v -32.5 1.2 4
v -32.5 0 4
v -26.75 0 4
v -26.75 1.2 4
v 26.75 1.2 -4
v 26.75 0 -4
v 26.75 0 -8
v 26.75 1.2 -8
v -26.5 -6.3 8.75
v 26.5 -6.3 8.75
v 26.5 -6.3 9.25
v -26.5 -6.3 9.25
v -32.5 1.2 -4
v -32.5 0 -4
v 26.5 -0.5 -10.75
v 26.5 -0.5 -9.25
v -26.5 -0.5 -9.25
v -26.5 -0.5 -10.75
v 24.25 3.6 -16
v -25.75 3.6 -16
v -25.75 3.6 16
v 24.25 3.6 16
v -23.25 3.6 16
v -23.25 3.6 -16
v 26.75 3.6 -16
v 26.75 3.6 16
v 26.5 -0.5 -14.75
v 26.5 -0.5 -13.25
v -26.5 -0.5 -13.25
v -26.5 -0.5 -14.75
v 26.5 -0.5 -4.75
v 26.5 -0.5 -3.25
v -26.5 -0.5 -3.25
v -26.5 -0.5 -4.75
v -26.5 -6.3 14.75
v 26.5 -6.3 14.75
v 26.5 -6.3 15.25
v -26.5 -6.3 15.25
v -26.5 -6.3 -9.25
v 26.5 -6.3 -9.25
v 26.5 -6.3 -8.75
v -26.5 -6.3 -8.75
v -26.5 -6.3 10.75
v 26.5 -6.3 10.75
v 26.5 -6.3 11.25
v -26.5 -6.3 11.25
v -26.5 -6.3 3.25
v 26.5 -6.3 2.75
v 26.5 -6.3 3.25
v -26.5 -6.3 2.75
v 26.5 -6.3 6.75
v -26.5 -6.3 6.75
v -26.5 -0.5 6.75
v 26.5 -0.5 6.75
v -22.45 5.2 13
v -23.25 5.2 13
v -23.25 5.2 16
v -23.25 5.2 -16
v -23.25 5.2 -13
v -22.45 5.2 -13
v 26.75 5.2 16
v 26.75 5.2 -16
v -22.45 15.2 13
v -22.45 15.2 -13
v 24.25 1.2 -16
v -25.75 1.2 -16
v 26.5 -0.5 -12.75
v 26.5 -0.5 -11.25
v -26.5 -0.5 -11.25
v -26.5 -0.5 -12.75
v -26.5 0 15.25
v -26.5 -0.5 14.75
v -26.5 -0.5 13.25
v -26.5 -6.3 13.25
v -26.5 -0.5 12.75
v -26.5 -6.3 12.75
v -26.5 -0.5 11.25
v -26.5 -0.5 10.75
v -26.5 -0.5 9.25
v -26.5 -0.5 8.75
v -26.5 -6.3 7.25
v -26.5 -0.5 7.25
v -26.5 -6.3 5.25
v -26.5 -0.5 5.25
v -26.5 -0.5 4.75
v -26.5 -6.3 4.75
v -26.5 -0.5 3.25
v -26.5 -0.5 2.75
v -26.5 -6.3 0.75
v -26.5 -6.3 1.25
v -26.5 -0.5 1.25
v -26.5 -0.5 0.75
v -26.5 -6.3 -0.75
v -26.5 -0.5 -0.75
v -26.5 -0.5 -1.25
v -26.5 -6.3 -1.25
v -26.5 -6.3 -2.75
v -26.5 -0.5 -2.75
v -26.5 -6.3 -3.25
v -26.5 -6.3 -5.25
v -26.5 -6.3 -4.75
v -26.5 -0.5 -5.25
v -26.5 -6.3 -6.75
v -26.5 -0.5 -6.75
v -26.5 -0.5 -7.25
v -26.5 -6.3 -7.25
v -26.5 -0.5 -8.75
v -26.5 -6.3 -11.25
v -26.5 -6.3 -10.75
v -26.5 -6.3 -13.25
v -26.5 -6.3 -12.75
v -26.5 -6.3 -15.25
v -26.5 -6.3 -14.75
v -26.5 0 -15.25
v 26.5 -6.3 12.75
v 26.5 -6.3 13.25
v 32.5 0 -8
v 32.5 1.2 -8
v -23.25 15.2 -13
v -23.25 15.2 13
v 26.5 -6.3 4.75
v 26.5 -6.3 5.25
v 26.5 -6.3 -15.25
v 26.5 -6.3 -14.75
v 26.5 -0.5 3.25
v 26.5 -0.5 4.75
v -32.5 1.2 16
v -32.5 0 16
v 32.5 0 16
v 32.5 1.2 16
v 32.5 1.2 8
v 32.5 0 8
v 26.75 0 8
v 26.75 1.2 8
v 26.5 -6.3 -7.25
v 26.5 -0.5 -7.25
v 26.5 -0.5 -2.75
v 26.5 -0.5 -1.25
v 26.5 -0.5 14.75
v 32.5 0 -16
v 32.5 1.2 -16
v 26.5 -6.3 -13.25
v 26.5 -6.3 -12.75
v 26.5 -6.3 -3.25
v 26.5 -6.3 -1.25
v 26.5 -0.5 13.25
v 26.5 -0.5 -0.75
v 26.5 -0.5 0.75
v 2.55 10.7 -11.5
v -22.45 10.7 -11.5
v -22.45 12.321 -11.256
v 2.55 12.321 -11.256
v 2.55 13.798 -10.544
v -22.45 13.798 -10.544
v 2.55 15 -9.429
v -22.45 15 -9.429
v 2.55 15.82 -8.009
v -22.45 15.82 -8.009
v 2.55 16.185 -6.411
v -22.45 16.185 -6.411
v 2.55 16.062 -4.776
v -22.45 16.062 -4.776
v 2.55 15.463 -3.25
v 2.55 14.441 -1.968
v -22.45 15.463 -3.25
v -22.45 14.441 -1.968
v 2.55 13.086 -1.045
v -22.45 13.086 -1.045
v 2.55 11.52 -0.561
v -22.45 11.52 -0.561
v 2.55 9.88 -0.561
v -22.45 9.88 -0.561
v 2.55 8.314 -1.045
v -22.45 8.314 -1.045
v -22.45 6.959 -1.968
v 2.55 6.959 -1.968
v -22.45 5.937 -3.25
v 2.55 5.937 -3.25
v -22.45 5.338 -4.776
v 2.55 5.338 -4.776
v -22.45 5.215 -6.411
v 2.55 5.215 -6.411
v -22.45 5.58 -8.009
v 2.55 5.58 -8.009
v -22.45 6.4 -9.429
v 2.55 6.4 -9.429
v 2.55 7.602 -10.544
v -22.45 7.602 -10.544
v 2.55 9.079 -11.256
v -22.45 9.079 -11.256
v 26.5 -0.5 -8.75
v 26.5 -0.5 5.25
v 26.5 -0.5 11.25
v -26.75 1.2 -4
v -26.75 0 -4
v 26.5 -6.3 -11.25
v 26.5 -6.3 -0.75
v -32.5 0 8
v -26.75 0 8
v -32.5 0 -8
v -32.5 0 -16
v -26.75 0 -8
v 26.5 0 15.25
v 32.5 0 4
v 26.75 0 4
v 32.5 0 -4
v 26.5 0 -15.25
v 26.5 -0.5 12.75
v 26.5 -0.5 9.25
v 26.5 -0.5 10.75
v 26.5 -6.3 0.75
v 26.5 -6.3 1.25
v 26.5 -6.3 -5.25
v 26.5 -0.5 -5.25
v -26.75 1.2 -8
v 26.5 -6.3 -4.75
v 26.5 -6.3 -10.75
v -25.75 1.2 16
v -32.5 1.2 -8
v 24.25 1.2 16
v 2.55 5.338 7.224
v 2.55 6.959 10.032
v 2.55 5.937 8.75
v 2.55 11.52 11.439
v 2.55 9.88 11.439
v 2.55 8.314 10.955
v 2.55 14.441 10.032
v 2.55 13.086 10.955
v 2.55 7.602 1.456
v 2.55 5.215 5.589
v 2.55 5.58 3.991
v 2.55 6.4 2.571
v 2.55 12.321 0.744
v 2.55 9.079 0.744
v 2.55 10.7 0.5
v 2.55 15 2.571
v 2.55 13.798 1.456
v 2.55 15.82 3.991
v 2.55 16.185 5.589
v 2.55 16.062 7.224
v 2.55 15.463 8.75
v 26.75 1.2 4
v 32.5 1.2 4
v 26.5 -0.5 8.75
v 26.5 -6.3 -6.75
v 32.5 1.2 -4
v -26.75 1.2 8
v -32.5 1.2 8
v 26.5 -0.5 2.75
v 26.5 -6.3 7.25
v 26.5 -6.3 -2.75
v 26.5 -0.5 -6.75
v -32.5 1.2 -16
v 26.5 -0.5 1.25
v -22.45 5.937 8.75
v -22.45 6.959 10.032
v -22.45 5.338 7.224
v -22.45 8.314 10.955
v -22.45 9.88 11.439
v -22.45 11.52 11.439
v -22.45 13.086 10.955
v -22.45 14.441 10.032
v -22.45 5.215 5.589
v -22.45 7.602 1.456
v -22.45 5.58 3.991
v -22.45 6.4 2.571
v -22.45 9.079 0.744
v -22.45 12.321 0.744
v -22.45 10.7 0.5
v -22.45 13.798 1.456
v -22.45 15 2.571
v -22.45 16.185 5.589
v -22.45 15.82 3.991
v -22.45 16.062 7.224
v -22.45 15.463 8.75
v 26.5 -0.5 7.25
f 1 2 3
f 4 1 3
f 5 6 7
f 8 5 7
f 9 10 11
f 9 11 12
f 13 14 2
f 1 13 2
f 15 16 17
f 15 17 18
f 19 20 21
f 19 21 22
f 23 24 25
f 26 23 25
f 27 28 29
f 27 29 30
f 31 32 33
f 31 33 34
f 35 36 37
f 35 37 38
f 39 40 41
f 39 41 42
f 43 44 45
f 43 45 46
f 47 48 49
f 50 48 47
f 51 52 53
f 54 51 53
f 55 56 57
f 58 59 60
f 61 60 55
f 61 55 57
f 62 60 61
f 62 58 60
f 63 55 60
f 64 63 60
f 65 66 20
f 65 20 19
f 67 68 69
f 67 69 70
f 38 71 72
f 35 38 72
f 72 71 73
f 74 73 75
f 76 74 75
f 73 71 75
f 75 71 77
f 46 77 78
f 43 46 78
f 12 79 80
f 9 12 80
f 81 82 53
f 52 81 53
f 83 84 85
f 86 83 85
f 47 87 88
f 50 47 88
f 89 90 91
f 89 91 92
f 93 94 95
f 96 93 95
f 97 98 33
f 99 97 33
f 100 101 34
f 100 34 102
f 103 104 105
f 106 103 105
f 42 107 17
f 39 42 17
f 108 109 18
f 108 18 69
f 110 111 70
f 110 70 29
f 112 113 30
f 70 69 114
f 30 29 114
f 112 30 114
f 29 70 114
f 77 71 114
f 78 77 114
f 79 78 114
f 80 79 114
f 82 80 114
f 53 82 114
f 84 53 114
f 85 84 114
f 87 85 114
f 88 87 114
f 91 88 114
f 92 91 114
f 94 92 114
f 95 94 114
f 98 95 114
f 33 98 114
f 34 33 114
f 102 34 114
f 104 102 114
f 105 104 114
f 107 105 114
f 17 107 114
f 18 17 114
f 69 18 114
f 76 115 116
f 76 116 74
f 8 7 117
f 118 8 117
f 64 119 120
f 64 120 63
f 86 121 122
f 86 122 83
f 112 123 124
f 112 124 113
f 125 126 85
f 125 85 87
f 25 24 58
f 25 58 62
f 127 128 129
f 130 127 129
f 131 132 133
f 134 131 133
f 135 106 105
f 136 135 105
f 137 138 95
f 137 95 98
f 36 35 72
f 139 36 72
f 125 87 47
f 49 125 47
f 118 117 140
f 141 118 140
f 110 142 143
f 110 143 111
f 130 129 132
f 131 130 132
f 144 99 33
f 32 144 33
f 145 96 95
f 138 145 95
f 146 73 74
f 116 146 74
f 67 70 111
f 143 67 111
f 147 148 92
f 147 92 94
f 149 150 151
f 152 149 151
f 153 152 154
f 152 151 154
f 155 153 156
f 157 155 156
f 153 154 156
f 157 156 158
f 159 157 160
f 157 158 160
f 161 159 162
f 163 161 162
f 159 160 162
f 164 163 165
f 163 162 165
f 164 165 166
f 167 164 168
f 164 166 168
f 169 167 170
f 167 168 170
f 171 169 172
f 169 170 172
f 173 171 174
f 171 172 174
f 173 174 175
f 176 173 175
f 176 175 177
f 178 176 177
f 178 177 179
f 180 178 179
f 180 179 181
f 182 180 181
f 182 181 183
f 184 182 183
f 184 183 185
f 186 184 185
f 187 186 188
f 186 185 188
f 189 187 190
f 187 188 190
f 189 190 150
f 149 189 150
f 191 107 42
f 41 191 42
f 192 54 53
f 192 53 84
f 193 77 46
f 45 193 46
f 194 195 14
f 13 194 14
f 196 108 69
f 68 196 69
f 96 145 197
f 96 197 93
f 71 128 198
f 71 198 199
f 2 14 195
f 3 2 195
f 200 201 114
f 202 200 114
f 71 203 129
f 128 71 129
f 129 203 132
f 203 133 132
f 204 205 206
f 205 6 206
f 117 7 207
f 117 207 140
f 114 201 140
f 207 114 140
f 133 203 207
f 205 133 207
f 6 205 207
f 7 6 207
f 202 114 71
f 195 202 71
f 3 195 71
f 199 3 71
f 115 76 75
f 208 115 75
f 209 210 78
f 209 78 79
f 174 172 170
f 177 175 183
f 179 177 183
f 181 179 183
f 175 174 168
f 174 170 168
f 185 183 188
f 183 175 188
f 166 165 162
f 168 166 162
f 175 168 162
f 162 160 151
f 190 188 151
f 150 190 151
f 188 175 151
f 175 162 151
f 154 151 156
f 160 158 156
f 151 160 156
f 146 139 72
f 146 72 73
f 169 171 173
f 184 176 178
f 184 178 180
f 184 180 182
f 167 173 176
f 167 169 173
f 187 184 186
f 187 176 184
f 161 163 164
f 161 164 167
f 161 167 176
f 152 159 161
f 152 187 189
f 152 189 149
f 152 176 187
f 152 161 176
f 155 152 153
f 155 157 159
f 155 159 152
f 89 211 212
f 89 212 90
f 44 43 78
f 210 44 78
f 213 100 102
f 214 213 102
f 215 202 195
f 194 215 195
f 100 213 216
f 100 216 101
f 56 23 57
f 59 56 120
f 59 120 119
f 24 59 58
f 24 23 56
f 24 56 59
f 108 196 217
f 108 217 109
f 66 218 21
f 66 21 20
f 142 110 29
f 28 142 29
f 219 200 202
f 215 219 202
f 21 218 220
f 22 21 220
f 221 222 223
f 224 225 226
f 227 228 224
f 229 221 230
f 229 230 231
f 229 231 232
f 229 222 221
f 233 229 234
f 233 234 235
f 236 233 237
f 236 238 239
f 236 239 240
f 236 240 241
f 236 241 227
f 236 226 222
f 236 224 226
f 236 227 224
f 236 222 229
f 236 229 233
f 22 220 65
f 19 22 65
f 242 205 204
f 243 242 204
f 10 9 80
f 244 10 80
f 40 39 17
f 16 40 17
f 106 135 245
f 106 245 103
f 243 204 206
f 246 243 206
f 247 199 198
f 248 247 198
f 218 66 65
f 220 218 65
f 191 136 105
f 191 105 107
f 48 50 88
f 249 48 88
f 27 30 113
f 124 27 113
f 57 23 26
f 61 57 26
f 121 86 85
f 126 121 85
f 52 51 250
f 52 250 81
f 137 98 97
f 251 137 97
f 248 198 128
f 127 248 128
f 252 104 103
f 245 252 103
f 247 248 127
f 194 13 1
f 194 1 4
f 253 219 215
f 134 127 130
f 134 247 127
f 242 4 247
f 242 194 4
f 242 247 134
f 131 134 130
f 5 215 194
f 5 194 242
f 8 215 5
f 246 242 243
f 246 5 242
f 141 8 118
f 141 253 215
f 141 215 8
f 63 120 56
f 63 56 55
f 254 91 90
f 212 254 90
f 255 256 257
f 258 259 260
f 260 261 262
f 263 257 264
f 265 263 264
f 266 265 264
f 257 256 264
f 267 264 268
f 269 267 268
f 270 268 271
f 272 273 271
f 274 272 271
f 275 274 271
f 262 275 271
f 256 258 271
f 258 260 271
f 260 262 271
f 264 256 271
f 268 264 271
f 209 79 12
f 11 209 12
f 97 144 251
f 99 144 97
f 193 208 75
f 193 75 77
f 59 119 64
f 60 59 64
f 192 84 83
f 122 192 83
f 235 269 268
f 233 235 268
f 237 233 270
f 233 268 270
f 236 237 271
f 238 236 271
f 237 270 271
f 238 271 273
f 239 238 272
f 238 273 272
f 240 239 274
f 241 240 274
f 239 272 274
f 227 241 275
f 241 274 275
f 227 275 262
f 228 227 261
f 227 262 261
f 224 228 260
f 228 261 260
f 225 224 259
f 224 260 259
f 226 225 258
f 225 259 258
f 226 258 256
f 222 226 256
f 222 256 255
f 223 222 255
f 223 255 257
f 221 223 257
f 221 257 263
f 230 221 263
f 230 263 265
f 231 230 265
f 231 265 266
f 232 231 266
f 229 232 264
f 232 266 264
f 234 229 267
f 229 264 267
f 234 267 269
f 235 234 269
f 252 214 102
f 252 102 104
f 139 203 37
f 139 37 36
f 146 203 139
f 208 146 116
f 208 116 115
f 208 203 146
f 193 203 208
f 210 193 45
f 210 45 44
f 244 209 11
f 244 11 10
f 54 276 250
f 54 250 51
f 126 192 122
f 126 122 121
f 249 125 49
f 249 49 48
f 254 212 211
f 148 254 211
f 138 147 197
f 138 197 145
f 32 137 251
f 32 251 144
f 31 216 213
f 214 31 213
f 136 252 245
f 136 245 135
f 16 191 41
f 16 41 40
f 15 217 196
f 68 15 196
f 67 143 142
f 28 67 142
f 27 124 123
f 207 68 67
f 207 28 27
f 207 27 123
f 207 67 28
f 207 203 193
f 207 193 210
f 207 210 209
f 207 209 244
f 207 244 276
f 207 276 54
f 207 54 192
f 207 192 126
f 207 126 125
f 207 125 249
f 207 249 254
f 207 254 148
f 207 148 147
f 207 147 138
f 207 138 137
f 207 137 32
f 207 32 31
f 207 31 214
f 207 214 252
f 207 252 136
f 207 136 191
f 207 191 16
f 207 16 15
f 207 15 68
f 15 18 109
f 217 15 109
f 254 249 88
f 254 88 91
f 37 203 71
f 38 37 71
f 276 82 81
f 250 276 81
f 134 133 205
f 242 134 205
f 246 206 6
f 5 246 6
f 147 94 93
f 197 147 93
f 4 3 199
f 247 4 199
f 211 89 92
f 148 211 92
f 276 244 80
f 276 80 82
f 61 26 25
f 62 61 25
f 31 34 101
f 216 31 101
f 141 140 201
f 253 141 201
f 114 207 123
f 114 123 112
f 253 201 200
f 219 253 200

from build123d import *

# Parameters (mm, degrees)
BOSS_EXTRUDE1_DEPTH   = 1.2
SKETCH2_W             = 50
SKETCH2_H             = 32
BOSS_EXTRUDE2_DEPTH   = 2.4
SKETCH3_W             = 50
SKETCH3_H             = 32
BOSS_EXTRUDE3_DEPTH   = 1.6
SKETCH4_W             = 0.8
SKETCH4_H             = 26
BOSS_EXTRUDE4_DEPTH   = 10
SKETCH5_R             = 5.5
BOSS_EXTRUDE6_DEPTH   = 25
BOSS_EXTRUDE6_2_DEPTH = 25
SKETCH6_W             = 53
SKETCH6_H             = 30.5
BOSS_EXTRUDE7_DEPTH   = 6.3
CUT_EXTRUDE7_DEPTH    = 60


with BuildPart() as part:
    # Sketch1 → Boss-Extrude1 (new body)
    with BuildSketch(Plane(origin=(0, 0, 0), x_dir=(1, 0, 0), z_dir=(0, 1, 0))):
        Polygon((-26.75, 16), (-32.5, 16), (-32.5, 8), (-26.75, 8), (-26.75, 4), (-32.5, 4), (-32.5, -4), (-26.75, -4), (-26.75, -8), (-32.5, -8), (-32.5, -16), (-26.75, -16), (26.75, -16), (32.5, -16), (32.5, -8), (26.75, -8), (26.75, -4), (32.5, -4), (32.5, 4), (26.75, 4), (26.75, 8), (32.5, 8), (32.5, 16), (26.75, 16), align=None)
    extrude(amount=BOSS_EXTRUDE1_DEPTH)

    # Sketch6 → Boss-Extrude7 (add)
    with BuildSketch(Plane(origin=(0, 0, 0), x_dir=(-1, 0, 0), z_dir=(0, -1, 0))):
        Rectangle(SKETCH6_W, SKETCH6_H)
    extrude(amount=BOSS_EXTRUDE7_DEPTH)

    # Sketch8 → Cut-Extrude7 (cut, through all)
    with BuildSketch(Plane(origin=(26.5, 0, 0), x_dir=(0, 0, -1), z_dir=(1, 0, 0))):
        Polygon((-15.25, 0), (-15.25, -6.3), (-14.75, -6.3), (-14.75, -0.5), (-13.25, -0.5), (-13.25, -6.3), (-12.75, -6.3), (-12.75, -0.5), (-11.25, -0.5), (-11.25, -6.3), (-10.75, -6.3), (-10.75, -0.5), (-9.25, -0.5), (-9.25, -6.3), (-8.75, -6.3), (-8.75, -0.5), (-7.25, -0.5), (-7.25, -6.3), (-6.75, -6.3), (-6.75, -0.5), (-5.25, -0.5), (-5.25, -6.3), (-4.75, -6.3), (-4.75, -0.5), (-3.25, -0.5), (-3.25, -6.3), (-2.75, -6.3), (-2.75, -0.5), (-1.25, -0.5), (-1.25, -6.3), (-0.75, -6.3), (-0.75, -0.5), (0.75, -0.5), (0.75, -6.3), (1.25, -6.3), (1.25, -0.5), (2.75, -0.5), (2.75, -6.3), (3.25, -6.3), (3.25, -0.5), (4.75, -0.5), (4.75, -6.3), (5.25, -6.3), (5.25, -0.5), (6.75, -0.5), (6.75, -6.3), (7.25, -6.3), (7.25, -0.5), (8.75, -0.5), (8.75, -6.3), (9.25, -6.3), (9.25, -0.5), (10.75, -0.5), (10.75, -6.3), (11.25, -6.3), (11.25, -0.5), (12.75, -0.5), (12.75, -6.3), (13.25, -6.3), (13.25, -0.5), (14.75, -0.5), (14.75, -6.3), (15.25, -6.3), (15.25, 0), (23.612450935, 0), (23.612450935, -15.947306279), (-23.612450935, -15.947306279), (-23.612450935, 0), align=None)
    extrude(amount=-CUT_EXTRUDE7_DEPTH, mode=Mode.SUBTRACT)


with BuildPart() as body_2:
    # Sketch2 → Boss-Extrude2 (new body)
    with BuildSketch(Plane(origin=(0, 1.2, 0), x_dir=(1, 0, 0), z_dir=(0, 1, 0))):
        with Locations((-0.75, 0)):
            Rectangle(SKETCH2_W, SKETCH2_H)
    extrude(amount=BOSS_EXTRUDE2_DEPTH)


with BuildPart() as body_3:
    # Sketch3 → Boss-Extrude3 (new body)
    with BuildSketch(Plane(origin=(0, 3.6, 0), x_dir=(1, 0, 0), z_dir=(0, 1, 0))):
        with Locations((1.75, 0)):
            Rectangle(SKETCH3_W, SKETCH3_H)
    extrude(amount=BOSS_EXTRUDE3_DEPTH)

    # Sketch4 → Boss-Extrude4 (add)
    with BuildSketch(Plane(origin=(0, 5.2, 0), x_dir=(1, 0, 0), z_dir=(0, 1, 0))):
        with Locations((-22.85, 0)):
            Rectangle(SKETCH4_W, SKETCH4_H)
    extrude(amount=BOSS_EXTRUDE4_DEPTH)


with BuildPart() as body_4:
    # Sketch5 → Boss-Extrude6 (new body)
    with BuildSketch(Plane(origin=(-22.45, 0, 0), x_dir=(0, 0, -1), z_dir=(1, 0, 0))):
        with Locations((-6, 10.7)):
            Circle(SKETCH5_R)
    extrude(amount=BOSS_EXTRUDE6_DEPTH)


with BuildPart() as body_5:
    # Sketch5 → Boss-Extrude6 2 (new body)
    with BuildSketch(Plane(origin=(-22.45, 0, 0), x_dir=(0, 0, -1), z_dir=(1, 0, 0))):
        with Locations((6, 10.7)):
            Circle(SKETCH5_R)
    extrude(amount=BOSS_EXTRUDE6_2_DEPTH)


solid = Compound([part.part, body_2.part, body_3.part, body_4.part, body_5.part])
